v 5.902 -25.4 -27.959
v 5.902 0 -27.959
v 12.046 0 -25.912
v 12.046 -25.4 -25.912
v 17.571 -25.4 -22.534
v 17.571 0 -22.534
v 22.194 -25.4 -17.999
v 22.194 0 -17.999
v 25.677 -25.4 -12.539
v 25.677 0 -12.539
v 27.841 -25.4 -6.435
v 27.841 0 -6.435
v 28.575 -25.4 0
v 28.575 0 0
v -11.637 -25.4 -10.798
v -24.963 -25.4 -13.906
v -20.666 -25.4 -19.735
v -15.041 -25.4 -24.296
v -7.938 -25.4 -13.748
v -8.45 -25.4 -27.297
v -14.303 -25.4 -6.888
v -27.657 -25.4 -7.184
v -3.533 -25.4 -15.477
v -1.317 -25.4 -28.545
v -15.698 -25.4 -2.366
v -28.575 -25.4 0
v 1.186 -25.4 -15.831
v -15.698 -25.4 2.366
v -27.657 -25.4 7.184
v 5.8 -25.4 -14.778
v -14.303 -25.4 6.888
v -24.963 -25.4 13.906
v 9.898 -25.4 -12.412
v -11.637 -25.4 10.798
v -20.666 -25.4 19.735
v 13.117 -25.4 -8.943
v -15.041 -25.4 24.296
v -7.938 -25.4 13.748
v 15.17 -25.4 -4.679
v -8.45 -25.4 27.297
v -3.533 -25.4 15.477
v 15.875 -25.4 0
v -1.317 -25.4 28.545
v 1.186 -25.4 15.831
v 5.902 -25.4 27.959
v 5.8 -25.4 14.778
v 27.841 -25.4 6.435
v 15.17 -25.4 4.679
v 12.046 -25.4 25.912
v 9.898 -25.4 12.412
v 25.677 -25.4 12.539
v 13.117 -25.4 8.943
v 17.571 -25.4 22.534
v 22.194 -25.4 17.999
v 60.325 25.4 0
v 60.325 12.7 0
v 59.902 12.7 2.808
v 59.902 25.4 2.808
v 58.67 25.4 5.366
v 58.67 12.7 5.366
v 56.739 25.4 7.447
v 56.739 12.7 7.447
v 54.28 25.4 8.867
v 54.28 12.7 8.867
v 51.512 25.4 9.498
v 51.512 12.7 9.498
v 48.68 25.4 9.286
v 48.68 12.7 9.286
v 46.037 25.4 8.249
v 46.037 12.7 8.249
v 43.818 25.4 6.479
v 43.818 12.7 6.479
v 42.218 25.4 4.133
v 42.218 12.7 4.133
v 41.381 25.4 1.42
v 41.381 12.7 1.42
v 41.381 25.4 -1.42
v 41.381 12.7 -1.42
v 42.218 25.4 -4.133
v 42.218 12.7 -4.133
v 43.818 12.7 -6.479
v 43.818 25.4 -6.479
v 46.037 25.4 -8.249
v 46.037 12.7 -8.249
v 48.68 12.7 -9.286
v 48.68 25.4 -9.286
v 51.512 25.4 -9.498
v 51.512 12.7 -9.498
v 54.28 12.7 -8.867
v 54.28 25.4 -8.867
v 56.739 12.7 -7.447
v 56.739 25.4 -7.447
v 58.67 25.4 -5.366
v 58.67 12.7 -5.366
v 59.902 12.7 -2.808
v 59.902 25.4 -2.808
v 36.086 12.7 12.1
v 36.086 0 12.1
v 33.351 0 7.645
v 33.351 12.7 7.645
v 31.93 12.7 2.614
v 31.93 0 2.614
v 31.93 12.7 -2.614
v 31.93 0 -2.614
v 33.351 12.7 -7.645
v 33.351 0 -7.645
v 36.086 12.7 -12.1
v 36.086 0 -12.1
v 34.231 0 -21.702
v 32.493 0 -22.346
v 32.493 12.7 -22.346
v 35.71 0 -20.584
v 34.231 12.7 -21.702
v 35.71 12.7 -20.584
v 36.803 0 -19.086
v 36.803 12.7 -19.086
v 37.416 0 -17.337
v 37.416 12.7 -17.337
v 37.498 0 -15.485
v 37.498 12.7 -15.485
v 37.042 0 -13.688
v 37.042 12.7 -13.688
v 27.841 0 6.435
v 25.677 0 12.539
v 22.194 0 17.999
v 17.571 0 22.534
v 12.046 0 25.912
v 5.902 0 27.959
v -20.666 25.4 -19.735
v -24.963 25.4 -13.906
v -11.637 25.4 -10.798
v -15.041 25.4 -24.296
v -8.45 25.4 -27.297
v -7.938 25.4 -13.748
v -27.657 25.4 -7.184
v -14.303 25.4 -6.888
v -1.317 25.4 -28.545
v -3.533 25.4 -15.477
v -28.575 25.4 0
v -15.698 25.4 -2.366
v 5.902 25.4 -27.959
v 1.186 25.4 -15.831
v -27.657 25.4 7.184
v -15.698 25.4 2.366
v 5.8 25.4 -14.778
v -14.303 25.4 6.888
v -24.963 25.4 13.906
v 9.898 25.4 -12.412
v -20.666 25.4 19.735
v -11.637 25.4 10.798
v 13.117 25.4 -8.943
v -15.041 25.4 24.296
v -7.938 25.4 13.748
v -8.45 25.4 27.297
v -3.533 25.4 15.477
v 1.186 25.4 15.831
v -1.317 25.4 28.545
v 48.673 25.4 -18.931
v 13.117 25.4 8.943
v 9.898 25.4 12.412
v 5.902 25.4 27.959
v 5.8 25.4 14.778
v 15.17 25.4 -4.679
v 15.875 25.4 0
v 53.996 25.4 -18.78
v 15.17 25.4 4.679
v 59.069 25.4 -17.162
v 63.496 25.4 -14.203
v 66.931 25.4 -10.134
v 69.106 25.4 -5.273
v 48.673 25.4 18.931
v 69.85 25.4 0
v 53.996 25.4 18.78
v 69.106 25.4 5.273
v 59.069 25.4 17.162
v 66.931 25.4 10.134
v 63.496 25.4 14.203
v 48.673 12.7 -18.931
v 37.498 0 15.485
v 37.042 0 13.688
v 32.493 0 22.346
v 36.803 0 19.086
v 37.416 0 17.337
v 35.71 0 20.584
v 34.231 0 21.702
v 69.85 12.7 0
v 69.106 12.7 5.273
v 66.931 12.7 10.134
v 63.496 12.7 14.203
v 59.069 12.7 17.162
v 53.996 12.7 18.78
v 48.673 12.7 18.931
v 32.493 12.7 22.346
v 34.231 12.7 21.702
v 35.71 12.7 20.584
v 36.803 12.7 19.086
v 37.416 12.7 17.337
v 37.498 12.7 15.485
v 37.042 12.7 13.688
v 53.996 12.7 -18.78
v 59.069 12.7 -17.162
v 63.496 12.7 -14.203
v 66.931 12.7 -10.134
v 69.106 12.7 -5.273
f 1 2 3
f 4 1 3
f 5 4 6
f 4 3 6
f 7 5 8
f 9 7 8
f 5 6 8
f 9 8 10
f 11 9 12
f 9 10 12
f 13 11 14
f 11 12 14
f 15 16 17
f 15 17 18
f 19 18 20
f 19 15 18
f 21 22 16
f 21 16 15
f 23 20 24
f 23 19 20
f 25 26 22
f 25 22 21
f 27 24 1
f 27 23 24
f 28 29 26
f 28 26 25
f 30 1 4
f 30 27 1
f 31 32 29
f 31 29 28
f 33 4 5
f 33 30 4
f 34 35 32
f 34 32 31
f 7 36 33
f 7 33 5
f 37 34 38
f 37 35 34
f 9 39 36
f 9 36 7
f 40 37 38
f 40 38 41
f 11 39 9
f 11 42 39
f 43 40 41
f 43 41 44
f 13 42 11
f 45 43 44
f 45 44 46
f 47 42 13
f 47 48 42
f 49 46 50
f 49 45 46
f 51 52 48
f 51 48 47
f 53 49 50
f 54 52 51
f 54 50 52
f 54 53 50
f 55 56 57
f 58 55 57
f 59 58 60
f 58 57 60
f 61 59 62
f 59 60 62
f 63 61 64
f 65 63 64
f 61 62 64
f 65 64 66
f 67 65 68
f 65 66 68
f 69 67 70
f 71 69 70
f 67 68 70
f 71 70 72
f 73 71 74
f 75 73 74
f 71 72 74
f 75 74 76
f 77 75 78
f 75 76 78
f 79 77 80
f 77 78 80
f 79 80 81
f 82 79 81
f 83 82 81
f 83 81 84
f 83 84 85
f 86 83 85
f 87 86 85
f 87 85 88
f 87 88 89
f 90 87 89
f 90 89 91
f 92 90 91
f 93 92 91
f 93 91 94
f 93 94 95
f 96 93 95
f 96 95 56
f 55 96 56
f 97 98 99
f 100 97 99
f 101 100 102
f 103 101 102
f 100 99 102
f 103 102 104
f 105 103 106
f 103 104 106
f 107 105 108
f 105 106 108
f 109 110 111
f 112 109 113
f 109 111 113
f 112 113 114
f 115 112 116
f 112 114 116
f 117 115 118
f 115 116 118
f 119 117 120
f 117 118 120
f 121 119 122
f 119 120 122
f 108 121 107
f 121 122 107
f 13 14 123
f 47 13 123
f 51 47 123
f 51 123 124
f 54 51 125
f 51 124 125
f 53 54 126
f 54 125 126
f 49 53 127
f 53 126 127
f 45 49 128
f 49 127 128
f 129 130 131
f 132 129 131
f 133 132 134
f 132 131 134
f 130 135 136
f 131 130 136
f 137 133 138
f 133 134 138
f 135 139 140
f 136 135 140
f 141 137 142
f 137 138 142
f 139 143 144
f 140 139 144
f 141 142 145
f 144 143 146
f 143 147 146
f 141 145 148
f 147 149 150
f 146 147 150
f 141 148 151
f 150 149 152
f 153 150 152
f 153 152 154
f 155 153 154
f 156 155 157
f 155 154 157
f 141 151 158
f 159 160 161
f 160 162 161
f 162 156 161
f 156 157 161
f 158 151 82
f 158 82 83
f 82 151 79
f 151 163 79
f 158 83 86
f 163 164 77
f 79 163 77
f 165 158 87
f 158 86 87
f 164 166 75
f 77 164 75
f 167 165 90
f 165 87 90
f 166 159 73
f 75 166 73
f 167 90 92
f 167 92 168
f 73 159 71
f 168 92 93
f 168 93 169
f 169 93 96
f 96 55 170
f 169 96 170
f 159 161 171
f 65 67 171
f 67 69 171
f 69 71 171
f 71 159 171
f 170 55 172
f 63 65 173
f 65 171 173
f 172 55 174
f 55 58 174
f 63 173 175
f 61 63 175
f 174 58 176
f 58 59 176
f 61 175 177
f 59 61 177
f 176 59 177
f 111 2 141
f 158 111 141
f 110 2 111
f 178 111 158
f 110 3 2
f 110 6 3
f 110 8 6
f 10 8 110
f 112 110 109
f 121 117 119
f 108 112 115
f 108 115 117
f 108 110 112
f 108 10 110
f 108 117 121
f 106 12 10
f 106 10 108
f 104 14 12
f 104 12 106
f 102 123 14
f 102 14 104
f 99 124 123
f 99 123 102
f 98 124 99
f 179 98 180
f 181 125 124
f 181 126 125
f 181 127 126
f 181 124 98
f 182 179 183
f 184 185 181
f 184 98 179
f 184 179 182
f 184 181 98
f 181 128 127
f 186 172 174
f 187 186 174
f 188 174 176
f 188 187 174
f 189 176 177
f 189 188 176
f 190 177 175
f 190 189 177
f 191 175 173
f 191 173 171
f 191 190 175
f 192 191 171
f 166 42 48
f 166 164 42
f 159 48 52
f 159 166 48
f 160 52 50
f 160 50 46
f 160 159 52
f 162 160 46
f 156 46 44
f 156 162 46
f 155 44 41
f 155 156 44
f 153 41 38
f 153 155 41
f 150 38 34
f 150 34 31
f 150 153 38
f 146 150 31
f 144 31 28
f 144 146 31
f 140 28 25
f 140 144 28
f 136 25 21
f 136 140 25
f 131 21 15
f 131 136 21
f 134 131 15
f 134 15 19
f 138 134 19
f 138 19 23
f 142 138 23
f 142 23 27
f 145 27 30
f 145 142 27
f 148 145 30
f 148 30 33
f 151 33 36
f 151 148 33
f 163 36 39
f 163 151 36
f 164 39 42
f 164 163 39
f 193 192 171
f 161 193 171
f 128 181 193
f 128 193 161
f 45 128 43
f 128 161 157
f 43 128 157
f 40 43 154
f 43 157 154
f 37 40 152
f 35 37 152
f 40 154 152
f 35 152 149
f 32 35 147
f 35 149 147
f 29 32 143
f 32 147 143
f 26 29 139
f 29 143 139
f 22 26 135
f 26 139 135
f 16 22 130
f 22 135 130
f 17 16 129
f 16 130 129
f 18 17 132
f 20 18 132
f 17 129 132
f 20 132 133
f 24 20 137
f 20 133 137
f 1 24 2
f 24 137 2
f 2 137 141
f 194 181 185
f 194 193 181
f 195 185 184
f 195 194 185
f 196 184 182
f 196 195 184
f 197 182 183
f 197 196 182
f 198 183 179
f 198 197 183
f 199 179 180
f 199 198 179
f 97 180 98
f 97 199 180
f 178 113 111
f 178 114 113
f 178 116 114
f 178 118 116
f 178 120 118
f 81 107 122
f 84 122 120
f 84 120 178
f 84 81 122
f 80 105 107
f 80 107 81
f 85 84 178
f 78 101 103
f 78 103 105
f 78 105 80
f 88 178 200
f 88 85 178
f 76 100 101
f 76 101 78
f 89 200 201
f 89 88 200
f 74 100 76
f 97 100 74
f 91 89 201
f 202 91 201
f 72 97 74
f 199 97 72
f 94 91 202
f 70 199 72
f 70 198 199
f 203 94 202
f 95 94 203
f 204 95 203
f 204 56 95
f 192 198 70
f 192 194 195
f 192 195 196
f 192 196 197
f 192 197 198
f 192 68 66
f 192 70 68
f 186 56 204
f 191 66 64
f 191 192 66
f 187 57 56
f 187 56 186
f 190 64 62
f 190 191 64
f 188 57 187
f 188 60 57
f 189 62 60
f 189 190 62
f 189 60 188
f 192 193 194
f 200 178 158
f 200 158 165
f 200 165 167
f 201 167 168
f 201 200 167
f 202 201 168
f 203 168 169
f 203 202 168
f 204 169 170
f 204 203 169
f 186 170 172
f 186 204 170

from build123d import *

# Parameters (mm, degrees)
F0_R     = 15.875
F0_R_2   = 9.525
F1_DEPTH = 25.4
F2_DEPTH = 25.4
F3_DEPTH = 12.7
F4_R     = 6.35


with BuildPart() as f1:
    # F0 (on Front) → F1 (new body)
    with BuildSketch(Plane.XZ):
        with BuildLine():
            ThreePointArc((5.9015777881, -27.9589342538), (22.1942358541, -17.998514379), (28.575, 0))
            ThreePointArc((28.575, 0), (22.1942358541, 17.998514379), (5.9015777881, 27.9589342538))
            ThreePointArc((5.9015777881, 27.9589342538), (-28.575, 0), (5.9015777881, -27.9589342538))
        make_face()
        Circle(F0_R, mode=Mode.SUBTRACT)
        with BuildLine():
            ThreePointArc((5.9015777881, 27.9589342538), (22.1942358541, 17.998514379), (28.575, 0))
            ThreePointArc((28.575, 0), (22.1942358541, -17.998514379), (5.9015777881, -27.9589342538))
            Line((5.9015777881, -27.9589342538), (48.6725341, -18.9308316998))
            ThreePointArc((48.6725341, -18.9308316998), (31.75, 0), (48.6725341, 18.9308316998))
            Line((48.6725341, 18.9308316998), (5.9015777881, 27.9589342538))
        make_face()
        with BuildLine():
            ThreePointArc((69.85, 0), (63.4959496416, 14.2026533682), (48.6725341, 18.9308316998))
            ThreePointArc((48.6725341, 18.9308316998), (31.75, 0), (48.6725341, -18.9308316998))
            ThreePointArc((48.6725341, -18.9308316998), (63.4959496416, -14.2026533682), (69.85, 0))
        make_face()
        with Locations((50.8, 0)):
            Circle(F0_R_2, mode=Mode.SUBTRACT)
    extrude(amount=-F1_DEPTH)

    # F0 (on Front) → F2 (join)
    with BuildSketch(Plane.XZ):
        with BuildLine():
            ThreePointArc((5.9015777881, -27.9589342538), (22.1942358541, -17.998514379), (28.575, 0))
            ThreePointArc((28.575, 0), (22.1942358541, 17.998514379), (5.9015777881, 27.9589342538))
            ThreePointArc((5.9015777881, 27.9589342538), (-28.575, 0), (5.9015777881, -27.9589342538))
        make_face()
        Circle(F0_R, mode=Mode.SUBTRACT)
    extrude(amount=F2_DEPTH)

    # F0 (on Front) → F3 (cut)
    with BuildSketch(Plane.XZ):
        with BuildLine():
            ThreePointArc((69.85, 0), (63.4959496416, 14.2026533682), (48.6725341, 18.9308316998))
            ThreePointArc((48.6725341, 18.9308316998), (31.75, 0), (48.6725341, -18.9308316998))
            ThreePointArc((48.6725341, -18.9308316998), (63.4959496416, -14.2026533682), (69.85, 0))
        make_face()
        with Locations((50.8, 0)):
            Circle(F0_R_2, mode=Mode.SUBTRACT)
    extrude(amount=-F3_DEPTH, mode=Mode.SUBTRACT)

    # F4
    f4_edges = [f1.edges().sort_by_distance(p)[0] for p in [
        (48.672534, 6.35, -18.930832),
        (48.672534, 6.35, 18.930832),
    ]]
    fillet(f4_edges, radius=F4_R)


solid = f1.part
